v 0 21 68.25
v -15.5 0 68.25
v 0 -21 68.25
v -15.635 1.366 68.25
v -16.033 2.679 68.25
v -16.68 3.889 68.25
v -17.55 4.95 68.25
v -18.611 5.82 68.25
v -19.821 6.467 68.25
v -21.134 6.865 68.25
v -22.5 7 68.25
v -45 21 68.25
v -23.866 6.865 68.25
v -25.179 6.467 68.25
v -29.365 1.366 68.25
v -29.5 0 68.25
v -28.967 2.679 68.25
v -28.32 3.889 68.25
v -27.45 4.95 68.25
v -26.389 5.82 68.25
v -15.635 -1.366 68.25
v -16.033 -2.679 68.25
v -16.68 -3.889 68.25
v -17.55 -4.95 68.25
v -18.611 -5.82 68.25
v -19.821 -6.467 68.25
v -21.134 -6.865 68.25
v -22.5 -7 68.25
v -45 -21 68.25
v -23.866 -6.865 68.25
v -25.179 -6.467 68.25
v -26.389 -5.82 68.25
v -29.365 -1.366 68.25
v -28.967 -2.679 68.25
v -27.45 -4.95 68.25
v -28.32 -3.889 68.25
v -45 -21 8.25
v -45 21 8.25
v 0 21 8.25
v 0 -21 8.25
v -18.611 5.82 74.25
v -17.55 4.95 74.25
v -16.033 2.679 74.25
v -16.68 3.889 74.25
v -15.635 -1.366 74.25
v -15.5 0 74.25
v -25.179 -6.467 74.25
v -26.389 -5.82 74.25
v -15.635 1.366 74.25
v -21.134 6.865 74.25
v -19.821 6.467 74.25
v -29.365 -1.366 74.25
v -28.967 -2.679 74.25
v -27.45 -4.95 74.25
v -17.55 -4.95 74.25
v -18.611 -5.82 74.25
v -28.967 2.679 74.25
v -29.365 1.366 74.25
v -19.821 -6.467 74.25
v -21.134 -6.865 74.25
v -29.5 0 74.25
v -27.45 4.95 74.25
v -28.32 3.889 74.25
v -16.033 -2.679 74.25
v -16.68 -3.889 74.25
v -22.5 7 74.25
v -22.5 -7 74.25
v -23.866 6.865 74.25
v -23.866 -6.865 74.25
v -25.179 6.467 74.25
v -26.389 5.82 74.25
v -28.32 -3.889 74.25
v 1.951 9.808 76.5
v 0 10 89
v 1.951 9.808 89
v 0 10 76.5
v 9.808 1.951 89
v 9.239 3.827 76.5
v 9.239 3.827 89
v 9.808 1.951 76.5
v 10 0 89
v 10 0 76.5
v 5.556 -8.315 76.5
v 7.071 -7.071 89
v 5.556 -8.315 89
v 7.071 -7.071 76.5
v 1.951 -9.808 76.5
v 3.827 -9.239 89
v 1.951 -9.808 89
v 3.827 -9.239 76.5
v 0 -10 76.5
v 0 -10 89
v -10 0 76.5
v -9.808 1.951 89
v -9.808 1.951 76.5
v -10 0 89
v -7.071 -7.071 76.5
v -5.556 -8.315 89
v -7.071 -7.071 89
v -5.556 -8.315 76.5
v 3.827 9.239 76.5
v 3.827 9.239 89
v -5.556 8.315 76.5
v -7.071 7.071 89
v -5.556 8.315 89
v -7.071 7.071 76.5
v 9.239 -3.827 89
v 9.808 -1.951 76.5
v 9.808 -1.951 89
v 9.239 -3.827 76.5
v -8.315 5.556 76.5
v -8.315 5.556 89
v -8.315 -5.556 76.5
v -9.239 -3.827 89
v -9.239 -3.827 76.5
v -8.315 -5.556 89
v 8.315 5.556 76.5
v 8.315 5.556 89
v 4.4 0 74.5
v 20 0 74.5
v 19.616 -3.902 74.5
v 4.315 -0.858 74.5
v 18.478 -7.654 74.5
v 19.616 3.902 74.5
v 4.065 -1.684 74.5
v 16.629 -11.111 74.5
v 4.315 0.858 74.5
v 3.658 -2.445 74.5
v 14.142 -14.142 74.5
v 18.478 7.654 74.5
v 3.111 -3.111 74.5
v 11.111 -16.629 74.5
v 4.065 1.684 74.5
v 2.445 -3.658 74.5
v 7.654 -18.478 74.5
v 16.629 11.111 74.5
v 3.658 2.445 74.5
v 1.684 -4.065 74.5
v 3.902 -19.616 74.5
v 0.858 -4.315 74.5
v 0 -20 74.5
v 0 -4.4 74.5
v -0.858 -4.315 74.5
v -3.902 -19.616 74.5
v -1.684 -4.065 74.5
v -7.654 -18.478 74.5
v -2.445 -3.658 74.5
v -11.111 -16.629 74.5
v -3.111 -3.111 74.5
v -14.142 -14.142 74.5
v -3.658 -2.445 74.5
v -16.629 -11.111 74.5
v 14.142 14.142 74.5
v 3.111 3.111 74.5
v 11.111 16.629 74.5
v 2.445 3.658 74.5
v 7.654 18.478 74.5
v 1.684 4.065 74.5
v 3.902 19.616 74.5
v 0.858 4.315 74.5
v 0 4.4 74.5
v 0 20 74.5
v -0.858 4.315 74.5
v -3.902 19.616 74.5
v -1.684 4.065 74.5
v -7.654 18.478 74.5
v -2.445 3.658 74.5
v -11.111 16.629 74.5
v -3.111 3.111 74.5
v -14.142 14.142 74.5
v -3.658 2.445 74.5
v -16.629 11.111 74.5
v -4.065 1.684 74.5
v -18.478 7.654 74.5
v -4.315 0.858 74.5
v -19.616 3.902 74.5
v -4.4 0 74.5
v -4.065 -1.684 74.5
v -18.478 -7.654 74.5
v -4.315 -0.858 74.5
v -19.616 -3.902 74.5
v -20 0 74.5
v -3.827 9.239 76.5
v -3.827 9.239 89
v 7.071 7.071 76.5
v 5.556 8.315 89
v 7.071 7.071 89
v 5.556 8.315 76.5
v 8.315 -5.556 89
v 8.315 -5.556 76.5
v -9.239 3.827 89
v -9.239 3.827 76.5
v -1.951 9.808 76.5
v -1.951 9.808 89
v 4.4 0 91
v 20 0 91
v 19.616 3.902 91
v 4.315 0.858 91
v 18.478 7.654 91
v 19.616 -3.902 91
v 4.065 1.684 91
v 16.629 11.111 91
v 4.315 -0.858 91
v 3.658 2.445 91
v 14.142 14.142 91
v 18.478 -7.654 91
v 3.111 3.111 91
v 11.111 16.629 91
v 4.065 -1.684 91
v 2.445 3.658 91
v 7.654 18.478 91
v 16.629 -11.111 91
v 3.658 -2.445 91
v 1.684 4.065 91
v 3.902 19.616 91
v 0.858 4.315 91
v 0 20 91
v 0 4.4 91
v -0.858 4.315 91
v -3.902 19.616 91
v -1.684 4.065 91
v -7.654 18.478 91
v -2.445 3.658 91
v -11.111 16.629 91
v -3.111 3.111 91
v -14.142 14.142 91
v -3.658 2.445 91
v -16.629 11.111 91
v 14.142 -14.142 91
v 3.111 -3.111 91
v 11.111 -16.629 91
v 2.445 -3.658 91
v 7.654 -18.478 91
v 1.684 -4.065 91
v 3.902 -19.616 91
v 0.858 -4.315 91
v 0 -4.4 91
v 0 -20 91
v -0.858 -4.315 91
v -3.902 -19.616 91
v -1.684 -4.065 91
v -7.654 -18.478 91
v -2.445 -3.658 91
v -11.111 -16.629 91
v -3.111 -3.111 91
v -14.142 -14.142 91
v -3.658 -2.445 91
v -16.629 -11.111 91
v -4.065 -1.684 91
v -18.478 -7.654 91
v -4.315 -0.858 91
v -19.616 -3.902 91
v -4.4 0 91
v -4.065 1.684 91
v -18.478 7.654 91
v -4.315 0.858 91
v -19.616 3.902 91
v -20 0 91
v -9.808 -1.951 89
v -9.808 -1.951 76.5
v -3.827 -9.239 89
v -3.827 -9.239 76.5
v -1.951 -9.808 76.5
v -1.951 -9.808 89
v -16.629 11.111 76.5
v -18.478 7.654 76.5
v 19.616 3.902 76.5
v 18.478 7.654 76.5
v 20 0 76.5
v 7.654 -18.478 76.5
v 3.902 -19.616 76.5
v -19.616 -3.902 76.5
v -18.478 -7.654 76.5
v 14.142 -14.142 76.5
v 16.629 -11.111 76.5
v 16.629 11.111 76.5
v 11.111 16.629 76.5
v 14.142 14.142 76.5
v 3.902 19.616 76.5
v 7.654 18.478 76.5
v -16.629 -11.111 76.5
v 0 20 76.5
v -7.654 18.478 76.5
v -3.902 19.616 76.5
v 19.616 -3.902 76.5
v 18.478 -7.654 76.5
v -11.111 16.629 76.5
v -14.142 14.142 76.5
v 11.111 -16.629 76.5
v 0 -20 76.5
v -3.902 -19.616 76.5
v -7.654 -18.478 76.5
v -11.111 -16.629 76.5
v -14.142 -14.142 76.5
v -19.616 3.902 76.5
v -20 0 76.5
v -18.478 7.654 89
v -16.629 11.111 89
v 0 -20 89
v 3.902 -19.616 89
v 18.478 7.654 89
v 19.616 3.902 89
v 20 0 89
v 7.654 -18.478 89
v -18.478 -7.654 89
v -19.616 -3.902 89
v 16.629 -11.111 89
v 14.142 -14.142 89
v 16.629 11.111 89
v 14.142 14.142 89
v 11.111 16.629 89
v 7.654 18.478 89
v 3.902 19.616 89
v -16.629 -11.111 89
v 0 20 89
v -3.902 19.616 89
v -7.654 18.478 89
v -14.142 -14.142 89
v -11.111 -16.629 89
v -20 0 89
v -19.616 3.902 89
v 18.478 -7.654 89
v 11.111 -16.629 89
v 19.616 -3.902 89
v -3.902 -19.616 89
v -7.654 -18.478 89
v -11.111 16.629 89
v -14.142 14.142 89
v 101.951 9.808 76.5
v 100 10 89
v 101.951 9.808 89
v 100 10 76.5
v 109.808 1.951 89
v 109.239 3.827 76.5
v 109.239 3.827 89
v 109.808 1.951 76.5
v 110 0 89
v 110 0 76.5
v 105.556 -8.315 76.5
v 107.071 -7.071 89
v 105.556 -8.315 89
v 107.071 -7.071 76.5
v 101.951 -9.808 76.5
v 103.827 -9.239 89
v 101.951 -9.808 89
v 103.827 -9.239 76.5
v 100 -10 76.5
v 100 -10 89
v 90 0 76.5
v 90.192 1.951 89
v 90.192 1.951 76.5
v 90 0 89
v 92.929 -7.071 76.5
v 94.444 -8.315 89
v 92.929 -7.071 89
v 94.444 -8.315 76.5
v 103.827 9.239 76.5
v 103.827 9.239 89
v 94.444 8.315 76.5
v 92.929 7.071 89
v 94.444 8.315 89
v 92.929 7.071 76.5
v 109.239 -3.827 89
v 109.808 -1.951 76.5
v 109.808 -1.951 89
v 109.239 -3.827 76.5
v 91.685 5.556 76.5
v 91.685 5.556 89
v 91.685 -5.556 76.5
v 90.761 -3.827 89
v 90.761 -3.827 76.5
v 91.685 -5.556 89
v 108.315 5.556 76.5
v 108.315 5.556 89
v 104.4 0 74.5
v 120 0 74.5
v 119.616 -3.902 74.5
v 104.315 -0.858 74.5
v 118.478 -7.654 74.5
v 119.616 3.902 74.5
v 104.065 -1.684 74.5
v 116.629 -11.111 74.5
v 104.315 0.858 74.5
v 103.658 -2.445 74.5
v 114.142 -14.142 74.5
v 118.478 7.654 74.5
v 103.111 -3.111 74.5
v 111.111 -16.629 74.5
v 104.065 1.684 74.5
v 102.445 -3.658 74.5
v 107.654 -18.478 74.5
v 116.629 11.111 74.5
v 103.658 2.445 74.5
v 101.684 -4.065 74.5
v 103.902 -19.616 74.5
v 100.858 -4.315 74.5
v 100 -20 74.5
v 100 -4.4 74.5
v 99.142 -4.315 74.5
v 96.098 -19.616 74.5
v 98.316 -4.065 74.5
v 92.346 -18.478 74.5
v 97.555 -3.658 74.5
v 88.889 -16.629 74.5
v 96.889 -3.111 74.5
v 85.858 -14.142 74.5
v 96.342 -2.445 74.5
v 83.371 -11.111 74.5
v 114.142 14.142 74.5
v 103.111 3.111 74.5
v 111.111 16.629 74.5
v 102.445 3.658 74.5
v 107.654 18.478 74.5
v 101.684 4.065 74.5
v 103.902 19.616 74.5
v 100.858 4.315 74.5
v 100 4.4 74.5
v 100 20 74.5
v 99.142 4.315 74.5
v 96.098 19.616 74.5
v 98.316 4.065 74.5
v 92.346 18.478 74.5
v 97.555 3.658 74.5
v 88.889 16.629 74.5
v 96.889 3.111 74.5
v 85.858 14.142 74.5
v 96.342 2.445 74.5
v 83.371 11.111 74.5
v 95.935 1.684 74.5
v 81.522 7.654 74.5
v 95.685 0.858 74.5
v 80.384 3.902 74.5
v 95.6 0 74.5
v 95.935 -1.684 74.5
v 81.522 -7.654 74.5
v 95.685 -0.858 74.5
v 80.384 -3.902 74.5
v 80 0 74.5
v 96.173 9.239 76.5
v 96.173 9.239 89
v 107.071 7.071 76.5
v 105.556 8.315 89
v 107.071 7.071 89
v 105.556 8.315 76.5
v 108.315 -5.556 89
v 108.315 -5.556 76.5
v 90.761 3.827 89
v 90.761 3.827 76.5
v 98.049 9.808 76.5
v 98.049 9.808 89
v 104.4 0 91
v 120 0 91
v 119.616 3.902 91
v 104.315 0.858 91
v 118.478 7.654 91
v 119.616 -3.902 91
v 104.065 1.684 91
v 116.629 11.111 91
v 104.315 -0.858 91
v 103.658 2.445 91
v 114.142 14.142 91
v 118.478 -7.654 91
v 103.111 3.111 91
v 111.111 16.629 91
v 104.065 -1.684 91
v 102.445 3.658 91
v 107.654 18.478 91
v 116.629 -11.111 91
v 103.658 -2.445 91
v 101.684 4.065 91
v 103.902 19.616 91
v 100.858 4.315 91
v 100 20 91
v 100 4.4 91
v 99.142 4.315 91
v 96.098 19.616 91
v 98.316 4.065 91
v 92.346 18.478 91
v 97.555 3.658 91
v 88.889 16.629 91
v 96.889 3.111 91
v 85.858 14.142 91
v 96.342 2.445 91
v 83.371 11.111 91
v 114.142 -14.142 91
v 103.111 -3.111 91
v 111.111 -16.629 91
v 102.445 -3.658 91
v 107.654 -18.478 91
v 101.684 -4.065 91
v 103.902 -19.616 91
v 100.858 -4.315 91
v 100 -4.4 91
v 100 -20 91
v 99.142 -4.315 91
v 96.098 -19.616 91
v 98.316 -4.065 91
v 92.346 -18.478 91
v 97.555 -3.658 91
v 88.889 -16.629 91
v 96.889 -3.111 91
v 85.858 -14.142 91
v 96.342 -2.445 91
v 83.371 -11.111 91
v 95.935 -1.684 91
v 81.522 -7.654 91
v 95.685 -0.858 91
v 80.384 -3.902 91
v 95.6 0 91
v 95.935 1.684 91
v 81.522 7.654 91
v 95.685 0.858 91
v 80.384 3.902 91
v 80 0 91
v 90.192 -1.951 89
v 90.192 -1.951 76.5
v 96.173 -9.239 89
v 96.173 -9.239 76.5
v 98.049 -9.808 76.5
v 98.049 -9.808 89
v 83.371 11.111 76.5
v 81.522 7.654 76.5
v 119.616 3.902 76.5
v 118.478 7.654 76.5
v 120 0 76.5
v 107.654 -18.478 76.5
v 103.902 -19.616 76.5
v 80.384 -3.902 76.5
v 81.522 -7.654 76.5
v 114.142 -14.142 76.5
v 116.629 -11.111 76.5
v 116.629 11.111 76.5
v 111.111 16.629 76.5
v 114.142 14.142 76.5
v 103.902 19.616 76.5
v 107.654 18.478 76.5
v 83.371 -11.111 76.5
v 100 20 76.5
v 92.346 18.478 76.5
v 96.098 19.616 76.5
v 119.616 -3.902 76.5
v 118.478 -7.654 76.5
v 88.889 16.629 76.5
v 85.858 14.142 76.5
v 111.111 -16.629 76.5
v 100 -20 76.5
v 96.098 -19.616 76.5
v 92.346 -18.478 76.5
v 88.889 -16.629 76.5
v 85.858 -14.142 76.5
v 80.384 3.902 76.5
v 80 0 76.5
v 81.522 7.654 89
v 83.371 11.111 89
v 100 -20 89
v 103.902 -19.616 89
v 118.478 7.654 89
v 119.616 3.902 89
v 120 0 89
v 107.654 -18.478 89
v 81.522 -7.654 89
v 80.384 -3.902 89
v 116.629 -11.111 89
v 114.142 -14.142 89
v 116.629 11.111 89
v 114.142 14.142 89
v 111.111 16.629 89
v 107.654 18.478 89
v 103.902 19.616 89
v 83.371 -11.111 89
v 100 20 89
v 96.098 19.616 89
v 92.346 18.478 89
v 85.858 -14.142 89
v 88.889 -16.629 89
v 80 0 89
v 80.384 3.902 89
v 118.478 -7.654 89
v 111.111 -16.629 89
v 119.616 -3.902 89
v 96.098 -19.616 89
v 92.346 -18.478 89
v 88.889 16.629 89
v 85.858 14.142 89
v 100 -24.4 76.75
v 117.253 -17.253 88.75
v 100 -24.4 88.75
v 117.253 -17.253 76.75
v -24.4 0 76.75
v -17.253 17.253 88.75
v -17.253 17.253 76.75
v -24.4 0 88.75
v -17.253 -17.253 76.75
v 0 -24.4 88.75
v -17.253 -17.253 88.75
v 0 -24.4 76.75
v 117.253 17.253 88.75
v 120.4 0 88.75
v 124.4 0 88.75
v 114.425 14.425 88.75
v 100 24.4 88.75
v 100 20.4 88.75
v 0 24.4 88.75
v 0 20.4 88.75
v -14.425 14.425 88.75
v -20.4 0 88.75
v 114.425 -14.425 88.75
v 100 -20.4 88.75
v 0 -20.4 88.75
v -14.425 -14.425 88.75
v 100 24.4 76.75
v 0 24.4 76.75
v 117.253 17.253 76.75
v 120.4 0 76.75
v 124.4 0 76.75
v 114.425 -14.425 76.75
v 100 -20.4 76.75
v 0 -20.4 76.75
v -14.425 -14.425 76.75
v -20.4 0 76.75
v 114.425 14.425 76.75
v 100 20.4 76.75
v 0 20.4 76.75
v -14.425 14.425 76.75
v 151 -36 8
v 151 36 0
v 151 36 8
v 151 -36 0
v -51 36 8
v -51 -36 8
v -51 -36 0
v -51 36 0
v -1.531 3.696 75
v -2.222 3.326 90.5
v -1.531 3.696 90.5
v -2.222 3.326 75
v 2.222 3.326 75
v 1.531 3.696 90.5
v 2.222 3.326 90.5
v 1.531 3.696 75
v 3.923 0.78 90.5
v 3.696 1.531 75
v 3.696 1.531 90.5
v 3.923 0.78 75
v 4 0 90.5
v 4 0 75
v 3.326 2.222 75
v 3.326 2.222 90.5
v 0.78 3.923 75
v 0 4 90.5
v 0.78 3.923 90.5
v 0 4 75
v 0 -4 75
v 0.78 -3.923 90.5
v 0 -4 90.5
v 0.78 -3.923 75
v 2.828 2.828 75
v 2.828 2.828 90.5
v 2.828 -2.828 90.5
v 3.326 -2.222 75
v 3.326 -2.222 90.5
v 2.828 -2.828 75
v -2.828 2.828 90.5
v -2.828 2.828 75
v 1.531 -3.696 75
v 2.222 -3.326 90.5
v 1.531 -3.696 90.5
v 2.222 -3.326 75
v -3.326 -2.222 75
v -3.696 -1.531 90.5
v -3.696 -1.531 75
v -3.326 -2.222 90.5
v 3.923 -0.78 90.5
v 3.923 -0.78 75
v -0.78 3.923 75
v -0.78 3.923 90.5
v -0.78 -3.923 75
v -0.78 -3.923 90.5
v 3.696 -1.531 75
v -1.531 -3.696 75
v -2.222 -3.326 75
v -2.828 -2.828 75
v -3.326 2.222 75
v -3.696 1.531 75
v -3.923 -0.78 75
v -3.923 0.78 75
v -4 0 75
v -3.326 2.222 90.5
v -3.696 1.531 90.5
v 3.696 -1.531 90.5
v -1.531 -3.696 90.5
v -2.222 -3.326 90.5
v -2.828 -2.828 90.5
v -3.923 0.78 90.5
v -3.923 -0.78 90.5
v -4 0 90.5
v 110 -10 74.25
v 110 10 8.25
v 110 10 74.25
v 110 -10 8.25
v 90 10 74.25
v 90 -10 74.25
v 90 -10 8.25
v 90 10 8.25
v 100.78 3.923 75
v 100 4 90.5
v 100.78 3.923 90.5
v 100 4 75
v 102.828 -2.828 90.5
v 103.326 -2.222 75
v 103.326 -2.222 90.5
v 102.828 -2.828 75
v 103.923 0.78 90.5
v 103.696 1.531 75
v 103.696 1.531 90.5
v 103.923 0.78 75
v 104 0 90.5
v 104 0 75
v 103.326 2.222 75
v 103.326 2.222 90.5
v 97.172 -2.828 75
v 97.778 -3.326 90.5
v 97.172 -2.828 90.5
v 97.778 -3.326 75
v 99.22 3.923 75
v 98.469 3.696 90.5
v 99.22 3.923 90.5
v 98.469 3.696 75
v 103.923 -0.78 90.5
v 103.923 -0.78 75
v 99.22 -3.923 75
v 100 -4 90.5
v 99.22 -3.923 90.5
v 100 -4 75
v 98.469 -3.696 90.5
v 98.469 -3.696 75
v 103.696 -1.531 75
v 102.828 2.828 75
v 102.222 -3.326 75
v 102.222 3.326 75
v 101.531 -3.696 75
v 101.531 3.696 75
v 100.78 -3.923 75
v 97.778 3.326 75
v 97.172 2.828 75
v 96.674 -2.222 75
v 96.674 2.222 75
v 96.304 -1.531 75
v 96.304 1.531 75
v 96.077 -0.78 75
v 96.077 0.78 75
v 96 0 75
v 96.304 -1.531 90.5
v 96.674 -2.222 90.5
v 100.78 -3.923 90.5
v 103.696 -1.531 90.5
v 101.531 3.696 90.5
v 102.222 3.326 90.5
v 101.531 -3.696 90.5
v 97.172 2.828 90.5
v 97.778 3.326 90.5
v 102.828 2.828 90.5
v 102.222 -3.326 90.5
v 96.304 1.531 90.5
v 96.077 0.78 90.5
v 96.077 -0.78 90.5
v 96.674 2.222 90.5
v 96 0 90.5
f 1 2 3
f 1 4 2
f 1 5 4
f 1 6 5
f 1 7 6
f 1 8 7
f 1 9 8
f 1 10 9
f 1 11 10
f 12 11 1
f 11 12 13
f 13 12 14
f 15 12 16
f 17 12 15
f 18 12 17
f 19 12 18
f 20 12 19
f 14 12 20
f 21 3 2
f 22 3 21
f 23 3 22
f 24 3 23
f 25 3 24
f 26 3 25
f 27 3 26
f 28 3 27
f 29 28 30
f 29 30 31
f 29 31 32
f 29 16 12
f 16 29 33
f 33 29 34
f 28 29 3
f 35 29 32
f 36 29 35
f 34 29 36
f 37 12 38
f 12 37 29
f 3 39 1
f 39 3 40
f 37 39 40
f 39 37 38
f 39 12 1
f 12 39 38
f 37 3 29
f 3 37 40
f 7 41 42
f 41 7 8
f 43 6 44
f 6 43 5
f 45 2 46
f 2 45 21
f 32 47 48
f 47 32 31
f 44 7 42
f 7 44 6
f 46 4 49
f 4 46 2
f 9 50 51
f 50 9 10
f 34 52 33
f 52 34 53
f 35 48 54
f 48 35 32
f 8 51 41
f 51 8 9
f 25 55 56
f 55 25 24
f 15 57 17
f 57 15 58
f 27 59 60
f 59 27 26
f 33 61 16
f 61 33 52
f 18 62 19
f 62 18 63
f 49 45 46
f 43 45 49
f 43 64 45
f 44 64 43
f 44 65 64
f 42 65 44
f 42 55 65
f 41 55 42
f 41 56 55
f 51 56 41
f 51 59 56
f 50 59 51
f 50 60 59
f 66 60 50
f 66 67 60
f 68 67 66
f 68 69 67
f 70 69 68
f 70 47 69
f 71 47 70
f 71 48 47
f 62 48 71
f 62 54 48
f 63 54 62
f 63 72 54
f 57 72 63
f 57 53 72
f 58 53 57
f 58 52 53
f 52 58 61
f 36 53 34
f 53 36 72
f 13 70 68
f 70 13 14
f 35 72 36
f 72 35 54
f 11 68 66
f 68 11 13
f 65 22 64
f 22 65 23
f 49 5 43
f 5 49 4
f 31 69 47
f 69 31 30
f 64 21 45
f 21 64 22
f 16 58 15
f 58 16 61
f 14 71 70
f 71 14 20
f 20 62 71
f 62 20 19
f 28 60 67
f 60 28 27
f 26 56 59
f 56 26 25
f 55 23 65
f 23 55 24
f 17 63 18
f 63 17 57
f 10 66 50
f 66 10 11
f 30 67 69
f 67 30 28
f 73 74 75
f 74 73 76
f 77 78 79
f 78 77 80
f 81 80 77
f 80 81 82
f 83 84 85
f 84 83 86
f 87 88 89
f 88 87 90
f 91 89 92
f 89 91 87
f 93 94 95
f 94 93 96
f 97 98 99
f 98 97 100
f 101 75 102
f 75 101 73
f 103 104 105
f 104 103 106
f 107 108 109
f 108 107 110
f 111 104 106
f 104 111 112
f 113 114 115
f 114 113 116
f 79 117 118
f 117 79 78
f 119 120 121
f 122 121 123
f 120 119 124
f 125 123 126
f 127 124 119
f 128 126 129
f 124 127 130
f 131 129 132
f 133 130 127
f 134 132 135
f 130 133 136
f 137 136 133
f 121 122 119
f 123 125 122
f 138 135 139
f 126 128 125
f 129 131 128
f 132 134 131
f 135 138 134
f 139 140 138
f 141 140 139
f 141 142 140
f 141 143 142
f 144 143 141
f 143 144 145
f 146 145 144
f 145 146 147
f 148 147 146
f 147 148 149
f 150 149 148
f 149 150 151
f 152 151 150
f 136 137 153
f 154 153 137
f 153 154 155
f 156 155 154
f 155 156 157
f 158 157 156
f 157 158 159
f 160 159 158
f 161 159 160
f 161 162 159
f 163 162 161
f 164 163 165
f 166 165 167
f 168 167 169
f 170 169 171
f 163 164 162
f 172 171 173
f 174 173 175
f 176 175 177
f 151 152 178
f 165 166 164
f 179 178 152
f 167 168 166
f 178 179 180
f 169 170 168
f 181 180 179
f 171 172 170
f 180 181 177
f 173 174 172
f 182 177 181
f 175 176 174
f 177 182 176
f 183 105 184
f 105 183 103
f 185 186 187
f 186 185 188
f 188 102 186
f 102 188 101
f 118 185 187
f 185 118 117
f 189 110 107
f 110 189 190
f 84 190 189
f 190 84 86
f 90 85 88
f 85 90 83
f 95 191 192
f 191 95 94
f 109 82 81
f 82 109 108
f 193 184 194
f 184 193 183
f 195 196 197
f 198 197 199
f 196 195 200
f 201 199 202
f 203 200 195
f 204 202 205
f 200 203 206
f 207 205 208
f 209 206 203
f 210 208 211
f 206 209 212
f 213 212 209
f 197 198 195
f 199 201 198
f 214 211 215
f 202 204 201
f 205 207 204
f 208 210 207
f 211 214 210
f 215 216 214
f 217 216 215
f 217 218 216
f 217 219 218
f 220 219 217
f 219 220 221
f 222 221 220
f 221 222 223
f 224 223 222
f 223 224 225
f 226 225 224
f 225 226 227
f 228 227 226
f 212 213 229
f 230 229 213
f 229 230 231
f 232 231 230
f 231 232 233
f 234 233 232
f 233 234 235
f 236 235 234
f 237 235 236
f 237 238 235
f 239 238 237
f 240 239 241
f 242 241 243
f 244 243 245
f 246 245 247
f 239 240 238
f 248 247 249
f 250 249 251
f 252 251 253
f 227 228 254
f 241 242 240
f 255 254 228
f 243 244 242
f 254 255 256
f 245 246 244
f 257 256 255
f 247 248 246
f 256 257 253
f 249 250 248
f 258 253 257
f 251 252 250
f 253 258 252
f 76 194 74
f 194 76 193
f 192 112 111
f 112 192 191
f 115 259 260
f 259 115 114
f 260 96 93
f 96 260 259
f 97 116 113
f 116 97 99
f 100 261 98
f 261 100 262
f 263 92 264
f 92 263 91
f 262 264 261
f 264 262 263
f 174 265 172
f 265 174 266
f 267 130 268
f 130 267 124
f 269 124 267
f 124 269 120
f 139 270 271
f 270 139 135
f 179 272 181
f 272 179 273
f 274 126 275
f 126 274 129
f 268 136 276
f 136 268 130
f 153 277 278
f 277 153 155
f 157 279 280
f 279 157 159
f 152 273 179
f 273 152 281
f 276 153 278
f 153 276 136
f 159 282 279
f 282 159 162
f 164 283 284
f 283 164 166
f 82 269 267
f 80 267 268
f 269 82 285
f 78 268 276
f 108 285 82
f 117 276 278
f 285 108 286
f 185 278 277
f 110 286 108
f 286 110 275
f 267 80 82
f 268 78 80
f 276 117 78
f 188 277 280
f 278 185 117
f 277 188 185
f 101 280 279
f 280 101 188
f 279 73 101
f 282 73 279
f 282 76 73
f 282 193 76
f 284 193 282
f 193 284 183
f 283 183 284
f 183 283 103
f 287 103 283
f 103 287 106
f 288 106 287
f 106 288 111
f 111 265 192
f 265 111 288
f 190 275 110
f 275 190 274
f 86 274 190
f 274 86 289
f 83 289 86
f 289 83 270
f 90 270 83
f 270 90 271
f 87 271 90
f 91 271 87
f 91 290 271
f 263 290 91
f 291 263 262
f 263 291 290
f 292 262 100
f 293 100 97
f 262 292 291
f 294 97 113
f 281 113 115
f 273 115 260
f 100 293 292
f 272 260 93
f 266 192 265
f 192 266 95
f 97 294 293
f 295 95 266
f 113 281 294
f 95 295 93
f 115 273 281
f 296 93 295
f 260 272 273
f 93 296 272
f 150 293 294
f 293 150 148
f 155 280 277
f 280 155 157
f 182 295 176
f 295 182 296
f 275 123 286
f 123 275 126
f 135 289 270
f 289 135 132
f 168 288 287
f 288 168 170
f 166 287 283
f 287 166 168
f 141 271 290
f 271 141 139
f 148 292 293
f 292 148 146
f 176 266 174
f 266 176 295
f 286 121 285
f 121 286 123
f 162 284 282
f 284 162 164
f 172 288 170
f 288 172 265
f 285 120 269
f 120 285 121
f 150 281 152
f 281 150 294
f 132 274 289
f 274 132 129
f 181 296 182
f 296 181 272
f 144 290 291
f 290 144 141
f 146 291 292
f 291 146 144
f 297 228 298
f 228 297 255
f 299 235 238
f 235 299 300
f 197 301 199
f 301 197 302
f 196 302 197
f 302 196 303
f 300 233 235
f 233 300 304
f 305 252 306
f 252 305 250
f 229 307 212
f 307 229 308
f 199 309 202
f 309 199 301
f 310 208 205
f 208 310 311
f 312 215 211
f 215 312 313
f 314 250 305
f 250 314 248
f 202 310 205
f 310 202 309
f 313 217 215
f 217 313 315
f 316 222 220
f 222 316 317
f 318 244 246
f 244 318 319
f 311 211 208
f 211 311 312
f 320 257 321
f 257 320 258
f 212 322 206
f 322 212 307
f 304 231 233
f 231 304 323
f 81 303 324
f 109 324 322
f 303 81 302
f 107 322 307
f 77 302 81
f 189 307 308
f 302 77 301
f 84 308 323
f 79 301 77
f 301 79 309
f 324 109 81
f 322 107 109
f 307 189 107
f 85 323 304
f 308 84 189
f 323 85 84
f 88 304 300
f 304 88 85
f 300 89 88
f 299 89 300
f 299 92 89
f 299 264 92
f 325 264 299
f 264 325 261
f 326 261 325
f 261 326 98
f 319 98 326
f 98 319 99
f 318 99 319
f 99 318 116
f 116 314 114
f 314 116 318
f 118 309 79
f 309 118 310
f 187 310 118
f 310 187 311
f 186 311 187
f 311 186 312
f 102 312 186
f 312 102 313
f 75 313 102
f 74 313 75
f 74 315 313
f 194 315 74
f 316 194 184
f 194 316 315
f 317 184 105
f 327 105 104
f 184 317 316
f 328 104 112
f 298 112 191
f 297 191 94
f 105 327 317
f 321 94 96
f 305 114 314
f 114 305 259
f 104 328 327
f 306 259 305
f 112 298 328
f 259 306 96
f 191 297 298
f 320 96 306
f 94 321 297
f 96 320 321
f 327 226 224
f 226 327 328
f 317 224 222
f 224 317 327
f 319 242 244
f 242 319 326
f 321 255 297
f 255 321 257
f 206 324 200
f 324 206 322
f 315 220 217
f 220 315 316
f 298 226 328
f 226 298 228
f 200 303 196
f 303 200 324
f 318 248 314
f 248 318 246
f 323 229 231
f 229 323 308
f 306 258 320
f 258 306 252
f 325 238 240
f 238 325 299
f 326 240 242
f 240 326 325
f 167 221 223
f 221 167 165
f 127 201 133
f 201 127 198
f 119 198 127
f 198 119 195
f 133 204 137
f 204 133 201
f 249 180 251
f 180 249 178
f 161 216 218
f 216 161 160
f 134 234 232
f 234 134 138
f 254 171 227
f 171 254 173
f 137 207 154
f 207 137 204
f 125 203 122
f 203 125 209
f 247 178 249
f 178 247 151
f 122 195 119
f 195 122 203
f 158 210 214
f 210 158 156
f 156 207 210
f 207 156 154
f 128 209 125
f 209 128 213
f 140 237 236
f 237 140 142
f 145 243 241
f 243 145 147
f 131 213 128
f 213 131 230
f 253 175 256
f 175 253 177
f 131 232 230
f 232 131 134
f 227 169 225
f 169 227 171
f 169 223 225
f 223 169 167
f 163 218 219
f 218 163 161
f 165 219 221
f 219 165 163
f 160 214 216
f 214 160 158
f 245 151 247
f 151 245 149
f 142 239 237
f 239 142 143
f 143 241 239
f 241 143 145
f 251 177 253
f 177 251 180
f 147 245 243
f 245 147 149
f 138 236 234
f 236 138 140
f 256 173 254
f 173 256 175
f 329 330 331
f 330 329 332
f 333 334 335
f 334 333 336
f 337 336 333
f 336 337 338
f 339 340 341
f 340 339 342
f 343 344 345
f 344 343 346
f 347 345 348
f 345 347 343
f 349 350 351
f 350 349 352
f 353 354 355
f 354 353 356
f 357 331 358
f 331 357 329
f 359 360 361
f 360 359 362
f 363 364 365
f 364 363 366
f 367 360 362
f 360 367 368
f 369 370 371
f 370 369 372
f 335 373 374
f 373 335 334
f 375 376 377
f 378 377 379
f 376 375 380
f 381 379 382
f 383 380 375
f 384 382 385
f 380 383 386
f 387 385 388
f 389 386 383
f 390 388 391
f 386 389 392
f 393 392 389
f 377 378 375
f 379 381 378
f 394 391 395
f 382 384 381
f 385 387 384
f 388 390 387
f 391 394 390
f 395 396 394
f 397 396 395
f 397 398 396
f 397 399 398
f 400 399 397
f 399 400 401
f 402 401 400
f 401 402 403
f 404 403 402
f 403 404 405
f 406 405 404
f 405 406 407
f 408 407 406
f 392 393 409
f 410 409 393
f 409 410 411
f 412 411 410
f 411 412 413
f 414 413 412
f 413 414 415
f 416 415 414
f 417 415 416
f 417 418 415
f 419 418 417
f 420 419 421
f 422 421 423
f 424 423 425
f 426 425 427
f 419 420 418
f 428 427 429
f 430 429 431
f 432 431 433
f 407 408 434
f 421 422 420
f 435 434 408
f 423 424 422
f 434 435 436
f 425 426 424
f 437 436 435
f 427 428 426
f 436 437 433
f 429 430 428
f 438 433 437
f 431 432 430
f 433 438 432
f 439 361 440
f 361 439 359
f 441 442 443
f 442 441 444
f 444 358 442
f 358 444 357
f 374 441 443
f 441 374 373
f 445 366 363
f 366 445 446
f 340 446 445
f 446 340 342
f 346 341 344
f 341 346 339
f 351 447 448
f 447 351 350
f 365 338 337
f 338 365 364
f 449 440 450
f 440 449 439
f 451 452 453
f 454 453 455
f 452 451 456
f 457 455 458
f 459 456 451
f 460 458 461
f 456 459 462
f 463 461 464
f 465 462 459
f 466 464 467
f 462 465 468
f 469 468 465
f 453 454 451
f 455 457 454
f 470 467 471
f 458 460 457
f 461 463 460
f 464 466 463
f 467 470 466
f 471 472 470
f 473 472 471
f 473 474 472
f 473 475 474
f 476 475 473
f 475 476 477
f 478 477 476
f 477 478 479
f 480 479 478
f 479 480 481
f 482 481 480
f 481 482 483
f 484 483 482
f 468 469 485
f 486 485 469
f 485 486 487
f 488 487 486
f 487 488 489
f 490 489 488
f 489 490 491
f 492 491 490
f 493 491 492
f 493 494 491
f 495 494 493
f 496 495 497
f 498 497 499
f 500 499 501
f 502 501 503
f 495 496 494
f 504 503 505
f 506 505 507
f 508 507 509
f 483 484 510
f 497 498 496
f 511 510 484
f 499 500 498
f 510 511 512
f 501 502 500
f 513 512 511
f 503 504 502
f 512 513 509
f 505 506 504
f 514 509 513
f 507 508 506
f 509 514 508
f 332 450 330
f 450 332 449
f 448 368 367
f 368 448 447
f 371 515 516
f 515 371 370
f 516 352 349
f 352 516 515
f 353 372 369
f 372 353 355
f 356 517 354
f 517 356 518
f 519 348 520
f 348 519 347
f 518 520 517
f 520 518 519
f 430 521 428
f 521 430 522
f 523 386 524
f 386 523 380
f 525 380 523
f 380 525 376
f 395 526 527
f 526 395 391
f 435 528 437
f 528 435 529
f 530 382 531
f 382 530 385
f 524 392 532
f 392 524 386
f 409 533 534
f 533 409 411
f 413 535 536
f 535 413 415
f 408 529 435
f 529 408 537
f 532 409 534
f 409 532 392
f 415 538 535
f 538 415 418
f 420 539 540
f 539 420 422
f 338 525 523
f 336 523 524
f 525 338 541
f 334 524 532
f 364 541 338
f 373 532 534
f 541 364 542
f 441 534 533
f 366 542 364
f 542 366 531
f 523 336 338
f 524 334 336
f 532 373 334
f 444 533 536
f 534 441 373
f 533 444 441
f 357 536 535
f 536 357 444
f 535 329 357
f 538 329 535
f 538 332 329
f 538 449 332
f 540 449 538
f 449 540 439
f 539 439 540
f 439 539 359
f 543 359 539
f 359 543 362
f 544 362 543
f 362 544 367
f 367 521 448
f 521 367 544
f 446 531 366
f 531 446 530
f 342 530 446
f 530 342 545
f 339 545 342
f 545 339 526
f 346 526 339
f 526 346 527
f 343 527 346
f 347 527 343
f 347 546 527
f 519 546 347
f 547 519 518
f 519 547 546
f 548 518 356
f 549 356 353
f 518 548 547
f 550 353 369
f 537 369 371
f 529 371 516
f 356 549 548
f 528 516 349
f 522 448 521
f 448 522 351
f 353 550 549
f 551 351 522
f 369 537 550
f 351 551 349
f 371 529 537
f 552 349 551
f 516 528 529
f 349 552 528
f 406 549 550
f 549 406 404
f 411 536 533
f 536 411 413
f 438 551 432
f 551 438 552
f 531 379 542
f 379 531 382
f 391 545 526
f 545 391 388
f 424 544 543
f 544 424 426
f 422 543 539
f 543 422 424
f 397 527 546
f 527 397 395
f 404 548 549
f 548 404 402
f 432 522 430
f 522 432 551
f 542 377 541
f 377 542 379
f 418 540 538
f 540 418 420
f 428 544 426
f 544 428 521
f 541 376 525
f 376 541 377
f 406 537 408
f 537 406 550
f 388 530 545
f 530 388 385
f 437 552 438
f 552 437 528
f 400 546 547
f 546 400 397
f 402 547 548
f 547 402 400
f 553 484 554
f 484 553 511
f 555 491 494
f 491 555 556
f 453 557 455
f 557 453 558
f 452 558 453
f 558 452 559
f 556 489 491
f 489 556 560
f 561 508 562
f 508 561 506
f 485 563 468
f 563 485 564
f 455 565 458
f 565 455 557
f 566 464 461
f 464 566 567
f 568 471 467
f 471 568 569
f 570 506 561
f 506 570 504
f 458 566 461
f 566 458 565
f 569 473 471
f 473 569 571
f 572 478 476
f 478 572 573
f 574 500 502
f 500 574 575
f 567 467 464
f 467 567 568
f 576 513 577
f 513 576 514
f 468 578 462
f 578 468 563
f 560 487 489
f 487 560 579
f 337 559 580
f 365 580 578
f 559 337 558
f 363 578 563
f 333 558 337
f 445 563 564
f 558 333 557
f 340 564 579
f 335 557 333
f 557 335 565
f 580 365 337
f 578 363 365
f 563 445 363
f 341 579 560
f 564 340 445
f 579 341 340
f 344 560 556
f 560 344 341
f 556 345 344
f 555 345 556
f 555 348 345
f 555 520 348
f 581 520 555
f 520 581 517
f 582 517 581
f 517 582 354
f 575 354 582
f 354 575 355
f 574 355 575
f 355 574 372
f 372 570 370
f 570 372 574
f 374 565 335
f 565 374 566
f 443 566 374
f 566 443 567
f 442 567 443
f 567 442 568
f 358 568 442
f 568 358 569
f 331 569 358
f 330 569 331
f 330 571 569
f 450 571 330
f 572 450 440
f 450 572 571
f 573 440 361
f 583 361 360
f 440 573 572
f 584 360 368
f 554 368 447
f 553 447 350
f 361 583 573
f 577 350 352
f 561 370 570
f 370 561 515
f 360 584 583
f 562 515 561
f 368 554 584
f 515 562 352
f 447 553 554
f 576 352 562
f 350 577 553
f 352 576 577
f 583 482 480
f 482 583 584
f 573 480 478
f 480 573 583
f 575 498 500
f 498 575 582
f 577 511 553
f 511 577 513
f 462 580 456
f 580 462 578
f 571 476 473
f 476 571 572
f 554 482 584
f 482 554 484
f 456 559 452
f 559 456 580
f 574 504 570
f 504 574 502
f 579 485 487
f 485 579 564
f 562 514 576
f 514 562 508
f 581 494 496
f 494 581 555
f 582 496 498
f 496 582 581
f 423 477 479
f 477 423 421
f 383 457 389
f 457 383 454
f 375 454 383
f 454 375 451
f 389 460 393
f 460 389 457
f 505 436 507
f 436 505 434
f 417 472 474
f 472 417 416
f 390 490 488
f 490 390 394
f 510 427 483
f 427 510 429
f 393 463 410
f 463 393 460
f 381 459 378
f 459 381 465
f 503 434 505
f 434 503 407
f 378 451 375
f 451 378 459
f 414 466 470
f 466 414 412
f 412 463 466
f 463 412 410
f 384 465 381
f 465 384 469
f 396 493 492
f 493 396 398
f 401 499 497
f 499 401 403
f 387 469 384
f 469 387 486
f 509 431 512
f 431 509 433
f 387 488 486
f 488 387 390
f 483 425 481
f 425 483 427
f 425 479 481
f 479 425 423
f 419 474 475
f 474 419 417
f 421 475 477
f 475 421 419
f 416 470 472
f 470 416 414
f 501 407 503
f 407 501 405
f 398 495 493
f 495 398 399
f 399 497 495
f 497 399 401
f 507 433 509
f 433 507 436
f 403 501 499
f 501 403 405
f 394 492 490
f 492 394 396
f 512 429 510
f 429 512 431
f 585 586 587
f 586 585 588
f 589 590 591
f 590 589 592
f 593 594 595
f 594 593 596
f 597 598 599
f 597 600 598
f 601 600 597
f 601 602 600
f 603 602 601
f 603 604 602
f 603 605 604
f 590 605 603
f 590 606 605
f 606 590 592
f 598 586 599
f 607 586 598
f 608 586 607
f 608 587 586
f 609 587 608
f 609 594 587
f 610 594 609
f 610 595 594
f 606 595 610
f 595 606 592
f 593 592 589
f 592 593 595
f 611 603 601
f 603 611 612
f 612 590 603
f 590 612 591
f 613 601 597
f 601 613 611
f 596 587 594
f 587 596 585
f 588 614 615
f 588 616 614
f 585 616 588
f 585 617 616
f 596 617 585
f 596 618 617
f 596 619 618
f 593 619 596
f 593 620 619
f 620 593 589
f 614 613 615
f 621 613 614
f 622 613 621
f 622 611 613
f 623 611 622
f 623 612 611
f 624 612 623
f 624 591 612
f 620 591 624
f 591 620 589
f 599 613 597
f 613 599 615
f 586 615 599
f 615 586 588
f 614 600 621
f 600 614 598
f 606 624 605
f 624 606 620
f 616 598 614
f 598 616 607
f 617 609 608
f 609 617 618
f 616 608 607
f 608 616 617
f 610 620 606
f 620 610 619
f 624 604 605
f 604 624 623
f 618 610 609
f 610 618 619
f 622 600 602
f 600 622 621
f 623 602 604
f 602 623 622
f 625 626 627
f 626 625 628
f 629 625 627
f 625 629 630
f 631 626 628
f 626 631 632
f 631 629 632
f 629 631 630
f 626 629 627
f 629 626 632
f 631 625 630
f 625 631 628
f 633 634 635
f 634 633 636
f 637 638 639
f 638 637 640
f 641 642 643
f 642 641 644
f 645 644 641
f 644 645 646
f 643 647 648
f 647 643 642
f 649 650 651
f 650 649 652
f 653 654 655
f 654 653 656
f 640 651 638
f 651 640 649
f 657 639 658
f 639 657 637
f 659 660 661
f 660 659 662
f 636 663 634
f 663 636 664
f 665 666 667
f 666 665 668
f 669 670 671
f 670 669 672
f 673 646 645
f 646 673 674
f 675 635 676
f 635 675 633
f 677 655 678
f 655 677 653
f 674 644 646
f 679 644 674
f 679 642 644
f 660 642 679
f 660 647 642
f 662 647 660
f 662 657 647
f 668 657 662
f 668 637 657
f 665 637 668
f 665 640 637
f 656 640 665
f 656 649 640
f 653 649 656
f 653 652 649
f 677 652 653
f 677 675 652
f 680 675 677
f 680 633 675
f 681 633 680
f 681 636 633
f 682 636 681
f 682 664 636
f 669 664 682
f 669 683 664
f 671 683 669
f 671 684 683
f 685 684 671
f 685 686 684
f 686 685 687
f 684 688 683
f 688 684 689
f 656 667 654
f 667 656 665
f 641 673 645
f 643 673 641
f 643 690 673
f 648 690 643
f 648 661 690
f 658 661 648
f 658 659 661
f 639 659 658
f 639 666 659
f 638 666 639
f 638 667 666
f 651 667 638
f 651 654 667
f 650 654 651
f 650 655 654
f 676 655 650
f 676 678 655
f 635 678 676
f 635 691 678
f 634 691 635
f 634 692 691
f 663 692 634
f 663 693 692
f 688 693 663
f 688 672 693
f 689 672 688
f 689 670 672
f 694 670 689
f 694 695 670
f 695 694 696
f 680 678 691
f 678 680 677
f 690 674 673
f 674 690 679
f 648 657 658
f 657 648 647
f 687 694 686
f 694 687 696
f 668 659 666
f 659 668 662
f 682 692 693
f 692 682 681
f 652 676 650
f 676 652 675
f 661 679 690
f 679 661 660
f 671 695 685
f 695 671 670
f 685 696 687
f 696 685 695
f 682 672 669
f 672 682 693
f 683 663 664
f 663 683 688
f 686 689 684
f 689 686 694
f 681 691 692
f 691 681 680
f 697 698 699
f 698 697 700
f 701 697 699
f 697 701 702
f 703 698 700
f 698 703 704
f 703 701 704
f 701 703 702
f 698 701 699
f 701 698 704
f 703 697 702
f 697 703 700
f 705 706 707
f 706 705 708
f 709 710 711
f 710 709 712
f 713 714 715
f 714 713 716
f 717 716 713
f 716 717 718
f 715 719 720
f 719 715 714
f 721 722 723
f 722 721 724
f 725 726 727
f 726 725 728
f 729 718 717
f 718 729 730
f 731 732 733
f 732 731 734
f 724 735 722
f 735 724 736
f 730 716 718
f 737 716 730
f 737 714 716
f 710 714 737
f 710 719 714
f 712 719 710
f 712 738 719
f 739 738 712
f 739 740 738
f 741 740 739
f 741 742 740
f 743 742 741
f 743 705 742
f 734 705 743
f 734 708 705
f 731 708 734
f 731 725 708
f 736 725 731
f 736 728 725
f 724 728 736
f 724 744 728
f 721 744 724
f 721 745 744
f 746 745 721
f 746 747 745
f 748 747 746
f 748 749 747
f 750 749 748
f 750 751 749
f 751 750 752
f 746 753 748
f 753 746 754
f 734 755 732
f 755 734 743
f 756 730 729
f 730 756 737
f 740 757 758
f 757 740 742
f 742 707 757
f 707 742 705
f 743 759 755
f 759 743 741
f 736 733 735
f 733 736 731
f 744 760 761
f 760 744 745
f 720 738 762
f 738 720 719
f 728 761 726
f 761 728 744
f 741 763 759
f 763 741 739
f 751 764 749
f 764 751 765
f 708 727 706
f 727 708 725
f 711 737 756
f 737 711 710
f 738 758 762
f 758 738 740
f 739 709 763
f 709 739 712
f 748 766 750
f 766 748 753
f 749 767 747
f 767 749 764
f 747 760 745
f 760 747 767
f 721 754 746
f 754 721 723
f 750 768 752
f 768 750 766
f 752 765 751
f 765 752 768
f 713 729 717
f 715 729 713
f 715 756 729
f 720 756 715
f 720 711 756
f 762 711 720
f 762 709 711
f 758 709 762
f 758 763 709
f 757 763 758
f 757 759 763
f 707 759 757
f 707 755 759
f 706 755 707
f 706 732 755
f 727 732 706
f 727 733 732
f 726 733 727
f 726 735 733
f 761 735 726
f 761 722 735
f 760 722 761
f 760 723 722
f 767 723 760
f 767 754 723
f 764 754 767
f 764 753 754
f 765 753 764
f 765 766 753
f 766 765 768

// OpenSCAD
$fn = 32;

// ------------------------------------------------------------------------
// Motor belt drive: span 100 mm, pulleys d40, belt 12 mm wide
// Every part is its own module, assembly() places every instance.
// ------------------------------------------------------------------------

// --- part 1 ---
module base_plate() {
  difference() {
    translate([-101, -36, 0]) cube([202, 72, 8]);
  }
}

// --- part 2 ---
module motor() {
  union() {
    translate([-30, -21, 0]) cube([60, 42, 45]);
    translate([33, 0, 22.5]) rotate([0, 90, 0]) cylinder(h = 6, d = 14, center = true);
  }
}

// --- part 3 ---
module drive_shaft() {
  translate([0, 0, -7.75]) cylinder(h = 15.5, d = 8);
}

// --- part 4 ---
module pulley_drive() {
  difference() {
    union() {
      cylinder(h = 16.5, d = 20);
      cylinder(h = 2, d = 40);
      translate([0, 0, 14.5]) cylinder(h = 2, d = 40);
    }
    translate([0, 0, -1]) cylinder(h = 18.5, d = 8.8);
  }
}

// --- part 5 ---
module idler_post() {
  translate([-10, -10, 0]) cube([20, 20, 66]);
}

// --- part 6 ---
module driven_shaft() {
  translate([0, 0, -7.75]) cylinder(h = 15.5, d = 8);
}

// --- part 7 ---
module pulley_driven() {
  difference() {
    union() {
      cylinder(h = 16.5, d = 20);
      cylinder(h = 2, d = 40);
      translate([0, 0, 14.5]) cylinder(h = 2, d = 40);
    }
    translate([0, 0, -1]) cylinder(h = 18.5, d = 8.8);
  }
}

// --- part 8 ---
module drive_belt() {
  difference() {
    linear_extrude(height = 12) polygon(points = concat([for (a = [90 : 45 : 270]) [24.4 * cos(a), 24.4 * sin(a)]], [for (a = [270 : 45 : 450]) [100 + 24.4 * cos(a), 24.4 * sin(a)]]));
    translate([0, 0, -1]) linear_extrude(height = 14) polygon(points = concat([for (a = [90 : 45 : 270]) [20.4 * cos(a), 20.4 * sin(a)]], [for (a = [270 : 45 : 450]) [100 + 20.4 * cos(a), 20.4 * sin(a)]]));
  }
}

// --- assembly ---
module assembly() {
  color([0.80, 0.24, 0.20]) translate([50, 0, 0]) rotate([0, 0, 0]) base_plate();
  color([0.20, 0.45, 0.75]) translate([0, 0, 38.25]) rotate([0, 270, 0]) motor();
  color([0.25, 0.62, 0.32]) translate([0, 0, 82.75]) rotate([0, 0, 0]) drive_shaft();
  color([0.92, 0.70, 0.18]) translate([0, 0, 74.5]) rotate([0, 0, 0]) pulley_drive();
  color([0.58, 0.35, 0.70]) translate([100, 0, 8.25]) rotate([0, 0, 0]) idler_post();
  color([0.16, 0.66, 0.66]) translate([100, 0, 82.75]) rotate([0, 0, 0]) driven_shaft();
  color([0.85, 0.48, 0.18]) translate([100, 0, 74.5]) rotate([0, 0, 0]) pulley_driven();
  color([0.55, 0.60, 0.65]) translate([0, 0, 76.75]) rotate([0, 0, 0]) drive_belt();
}

assembly();
